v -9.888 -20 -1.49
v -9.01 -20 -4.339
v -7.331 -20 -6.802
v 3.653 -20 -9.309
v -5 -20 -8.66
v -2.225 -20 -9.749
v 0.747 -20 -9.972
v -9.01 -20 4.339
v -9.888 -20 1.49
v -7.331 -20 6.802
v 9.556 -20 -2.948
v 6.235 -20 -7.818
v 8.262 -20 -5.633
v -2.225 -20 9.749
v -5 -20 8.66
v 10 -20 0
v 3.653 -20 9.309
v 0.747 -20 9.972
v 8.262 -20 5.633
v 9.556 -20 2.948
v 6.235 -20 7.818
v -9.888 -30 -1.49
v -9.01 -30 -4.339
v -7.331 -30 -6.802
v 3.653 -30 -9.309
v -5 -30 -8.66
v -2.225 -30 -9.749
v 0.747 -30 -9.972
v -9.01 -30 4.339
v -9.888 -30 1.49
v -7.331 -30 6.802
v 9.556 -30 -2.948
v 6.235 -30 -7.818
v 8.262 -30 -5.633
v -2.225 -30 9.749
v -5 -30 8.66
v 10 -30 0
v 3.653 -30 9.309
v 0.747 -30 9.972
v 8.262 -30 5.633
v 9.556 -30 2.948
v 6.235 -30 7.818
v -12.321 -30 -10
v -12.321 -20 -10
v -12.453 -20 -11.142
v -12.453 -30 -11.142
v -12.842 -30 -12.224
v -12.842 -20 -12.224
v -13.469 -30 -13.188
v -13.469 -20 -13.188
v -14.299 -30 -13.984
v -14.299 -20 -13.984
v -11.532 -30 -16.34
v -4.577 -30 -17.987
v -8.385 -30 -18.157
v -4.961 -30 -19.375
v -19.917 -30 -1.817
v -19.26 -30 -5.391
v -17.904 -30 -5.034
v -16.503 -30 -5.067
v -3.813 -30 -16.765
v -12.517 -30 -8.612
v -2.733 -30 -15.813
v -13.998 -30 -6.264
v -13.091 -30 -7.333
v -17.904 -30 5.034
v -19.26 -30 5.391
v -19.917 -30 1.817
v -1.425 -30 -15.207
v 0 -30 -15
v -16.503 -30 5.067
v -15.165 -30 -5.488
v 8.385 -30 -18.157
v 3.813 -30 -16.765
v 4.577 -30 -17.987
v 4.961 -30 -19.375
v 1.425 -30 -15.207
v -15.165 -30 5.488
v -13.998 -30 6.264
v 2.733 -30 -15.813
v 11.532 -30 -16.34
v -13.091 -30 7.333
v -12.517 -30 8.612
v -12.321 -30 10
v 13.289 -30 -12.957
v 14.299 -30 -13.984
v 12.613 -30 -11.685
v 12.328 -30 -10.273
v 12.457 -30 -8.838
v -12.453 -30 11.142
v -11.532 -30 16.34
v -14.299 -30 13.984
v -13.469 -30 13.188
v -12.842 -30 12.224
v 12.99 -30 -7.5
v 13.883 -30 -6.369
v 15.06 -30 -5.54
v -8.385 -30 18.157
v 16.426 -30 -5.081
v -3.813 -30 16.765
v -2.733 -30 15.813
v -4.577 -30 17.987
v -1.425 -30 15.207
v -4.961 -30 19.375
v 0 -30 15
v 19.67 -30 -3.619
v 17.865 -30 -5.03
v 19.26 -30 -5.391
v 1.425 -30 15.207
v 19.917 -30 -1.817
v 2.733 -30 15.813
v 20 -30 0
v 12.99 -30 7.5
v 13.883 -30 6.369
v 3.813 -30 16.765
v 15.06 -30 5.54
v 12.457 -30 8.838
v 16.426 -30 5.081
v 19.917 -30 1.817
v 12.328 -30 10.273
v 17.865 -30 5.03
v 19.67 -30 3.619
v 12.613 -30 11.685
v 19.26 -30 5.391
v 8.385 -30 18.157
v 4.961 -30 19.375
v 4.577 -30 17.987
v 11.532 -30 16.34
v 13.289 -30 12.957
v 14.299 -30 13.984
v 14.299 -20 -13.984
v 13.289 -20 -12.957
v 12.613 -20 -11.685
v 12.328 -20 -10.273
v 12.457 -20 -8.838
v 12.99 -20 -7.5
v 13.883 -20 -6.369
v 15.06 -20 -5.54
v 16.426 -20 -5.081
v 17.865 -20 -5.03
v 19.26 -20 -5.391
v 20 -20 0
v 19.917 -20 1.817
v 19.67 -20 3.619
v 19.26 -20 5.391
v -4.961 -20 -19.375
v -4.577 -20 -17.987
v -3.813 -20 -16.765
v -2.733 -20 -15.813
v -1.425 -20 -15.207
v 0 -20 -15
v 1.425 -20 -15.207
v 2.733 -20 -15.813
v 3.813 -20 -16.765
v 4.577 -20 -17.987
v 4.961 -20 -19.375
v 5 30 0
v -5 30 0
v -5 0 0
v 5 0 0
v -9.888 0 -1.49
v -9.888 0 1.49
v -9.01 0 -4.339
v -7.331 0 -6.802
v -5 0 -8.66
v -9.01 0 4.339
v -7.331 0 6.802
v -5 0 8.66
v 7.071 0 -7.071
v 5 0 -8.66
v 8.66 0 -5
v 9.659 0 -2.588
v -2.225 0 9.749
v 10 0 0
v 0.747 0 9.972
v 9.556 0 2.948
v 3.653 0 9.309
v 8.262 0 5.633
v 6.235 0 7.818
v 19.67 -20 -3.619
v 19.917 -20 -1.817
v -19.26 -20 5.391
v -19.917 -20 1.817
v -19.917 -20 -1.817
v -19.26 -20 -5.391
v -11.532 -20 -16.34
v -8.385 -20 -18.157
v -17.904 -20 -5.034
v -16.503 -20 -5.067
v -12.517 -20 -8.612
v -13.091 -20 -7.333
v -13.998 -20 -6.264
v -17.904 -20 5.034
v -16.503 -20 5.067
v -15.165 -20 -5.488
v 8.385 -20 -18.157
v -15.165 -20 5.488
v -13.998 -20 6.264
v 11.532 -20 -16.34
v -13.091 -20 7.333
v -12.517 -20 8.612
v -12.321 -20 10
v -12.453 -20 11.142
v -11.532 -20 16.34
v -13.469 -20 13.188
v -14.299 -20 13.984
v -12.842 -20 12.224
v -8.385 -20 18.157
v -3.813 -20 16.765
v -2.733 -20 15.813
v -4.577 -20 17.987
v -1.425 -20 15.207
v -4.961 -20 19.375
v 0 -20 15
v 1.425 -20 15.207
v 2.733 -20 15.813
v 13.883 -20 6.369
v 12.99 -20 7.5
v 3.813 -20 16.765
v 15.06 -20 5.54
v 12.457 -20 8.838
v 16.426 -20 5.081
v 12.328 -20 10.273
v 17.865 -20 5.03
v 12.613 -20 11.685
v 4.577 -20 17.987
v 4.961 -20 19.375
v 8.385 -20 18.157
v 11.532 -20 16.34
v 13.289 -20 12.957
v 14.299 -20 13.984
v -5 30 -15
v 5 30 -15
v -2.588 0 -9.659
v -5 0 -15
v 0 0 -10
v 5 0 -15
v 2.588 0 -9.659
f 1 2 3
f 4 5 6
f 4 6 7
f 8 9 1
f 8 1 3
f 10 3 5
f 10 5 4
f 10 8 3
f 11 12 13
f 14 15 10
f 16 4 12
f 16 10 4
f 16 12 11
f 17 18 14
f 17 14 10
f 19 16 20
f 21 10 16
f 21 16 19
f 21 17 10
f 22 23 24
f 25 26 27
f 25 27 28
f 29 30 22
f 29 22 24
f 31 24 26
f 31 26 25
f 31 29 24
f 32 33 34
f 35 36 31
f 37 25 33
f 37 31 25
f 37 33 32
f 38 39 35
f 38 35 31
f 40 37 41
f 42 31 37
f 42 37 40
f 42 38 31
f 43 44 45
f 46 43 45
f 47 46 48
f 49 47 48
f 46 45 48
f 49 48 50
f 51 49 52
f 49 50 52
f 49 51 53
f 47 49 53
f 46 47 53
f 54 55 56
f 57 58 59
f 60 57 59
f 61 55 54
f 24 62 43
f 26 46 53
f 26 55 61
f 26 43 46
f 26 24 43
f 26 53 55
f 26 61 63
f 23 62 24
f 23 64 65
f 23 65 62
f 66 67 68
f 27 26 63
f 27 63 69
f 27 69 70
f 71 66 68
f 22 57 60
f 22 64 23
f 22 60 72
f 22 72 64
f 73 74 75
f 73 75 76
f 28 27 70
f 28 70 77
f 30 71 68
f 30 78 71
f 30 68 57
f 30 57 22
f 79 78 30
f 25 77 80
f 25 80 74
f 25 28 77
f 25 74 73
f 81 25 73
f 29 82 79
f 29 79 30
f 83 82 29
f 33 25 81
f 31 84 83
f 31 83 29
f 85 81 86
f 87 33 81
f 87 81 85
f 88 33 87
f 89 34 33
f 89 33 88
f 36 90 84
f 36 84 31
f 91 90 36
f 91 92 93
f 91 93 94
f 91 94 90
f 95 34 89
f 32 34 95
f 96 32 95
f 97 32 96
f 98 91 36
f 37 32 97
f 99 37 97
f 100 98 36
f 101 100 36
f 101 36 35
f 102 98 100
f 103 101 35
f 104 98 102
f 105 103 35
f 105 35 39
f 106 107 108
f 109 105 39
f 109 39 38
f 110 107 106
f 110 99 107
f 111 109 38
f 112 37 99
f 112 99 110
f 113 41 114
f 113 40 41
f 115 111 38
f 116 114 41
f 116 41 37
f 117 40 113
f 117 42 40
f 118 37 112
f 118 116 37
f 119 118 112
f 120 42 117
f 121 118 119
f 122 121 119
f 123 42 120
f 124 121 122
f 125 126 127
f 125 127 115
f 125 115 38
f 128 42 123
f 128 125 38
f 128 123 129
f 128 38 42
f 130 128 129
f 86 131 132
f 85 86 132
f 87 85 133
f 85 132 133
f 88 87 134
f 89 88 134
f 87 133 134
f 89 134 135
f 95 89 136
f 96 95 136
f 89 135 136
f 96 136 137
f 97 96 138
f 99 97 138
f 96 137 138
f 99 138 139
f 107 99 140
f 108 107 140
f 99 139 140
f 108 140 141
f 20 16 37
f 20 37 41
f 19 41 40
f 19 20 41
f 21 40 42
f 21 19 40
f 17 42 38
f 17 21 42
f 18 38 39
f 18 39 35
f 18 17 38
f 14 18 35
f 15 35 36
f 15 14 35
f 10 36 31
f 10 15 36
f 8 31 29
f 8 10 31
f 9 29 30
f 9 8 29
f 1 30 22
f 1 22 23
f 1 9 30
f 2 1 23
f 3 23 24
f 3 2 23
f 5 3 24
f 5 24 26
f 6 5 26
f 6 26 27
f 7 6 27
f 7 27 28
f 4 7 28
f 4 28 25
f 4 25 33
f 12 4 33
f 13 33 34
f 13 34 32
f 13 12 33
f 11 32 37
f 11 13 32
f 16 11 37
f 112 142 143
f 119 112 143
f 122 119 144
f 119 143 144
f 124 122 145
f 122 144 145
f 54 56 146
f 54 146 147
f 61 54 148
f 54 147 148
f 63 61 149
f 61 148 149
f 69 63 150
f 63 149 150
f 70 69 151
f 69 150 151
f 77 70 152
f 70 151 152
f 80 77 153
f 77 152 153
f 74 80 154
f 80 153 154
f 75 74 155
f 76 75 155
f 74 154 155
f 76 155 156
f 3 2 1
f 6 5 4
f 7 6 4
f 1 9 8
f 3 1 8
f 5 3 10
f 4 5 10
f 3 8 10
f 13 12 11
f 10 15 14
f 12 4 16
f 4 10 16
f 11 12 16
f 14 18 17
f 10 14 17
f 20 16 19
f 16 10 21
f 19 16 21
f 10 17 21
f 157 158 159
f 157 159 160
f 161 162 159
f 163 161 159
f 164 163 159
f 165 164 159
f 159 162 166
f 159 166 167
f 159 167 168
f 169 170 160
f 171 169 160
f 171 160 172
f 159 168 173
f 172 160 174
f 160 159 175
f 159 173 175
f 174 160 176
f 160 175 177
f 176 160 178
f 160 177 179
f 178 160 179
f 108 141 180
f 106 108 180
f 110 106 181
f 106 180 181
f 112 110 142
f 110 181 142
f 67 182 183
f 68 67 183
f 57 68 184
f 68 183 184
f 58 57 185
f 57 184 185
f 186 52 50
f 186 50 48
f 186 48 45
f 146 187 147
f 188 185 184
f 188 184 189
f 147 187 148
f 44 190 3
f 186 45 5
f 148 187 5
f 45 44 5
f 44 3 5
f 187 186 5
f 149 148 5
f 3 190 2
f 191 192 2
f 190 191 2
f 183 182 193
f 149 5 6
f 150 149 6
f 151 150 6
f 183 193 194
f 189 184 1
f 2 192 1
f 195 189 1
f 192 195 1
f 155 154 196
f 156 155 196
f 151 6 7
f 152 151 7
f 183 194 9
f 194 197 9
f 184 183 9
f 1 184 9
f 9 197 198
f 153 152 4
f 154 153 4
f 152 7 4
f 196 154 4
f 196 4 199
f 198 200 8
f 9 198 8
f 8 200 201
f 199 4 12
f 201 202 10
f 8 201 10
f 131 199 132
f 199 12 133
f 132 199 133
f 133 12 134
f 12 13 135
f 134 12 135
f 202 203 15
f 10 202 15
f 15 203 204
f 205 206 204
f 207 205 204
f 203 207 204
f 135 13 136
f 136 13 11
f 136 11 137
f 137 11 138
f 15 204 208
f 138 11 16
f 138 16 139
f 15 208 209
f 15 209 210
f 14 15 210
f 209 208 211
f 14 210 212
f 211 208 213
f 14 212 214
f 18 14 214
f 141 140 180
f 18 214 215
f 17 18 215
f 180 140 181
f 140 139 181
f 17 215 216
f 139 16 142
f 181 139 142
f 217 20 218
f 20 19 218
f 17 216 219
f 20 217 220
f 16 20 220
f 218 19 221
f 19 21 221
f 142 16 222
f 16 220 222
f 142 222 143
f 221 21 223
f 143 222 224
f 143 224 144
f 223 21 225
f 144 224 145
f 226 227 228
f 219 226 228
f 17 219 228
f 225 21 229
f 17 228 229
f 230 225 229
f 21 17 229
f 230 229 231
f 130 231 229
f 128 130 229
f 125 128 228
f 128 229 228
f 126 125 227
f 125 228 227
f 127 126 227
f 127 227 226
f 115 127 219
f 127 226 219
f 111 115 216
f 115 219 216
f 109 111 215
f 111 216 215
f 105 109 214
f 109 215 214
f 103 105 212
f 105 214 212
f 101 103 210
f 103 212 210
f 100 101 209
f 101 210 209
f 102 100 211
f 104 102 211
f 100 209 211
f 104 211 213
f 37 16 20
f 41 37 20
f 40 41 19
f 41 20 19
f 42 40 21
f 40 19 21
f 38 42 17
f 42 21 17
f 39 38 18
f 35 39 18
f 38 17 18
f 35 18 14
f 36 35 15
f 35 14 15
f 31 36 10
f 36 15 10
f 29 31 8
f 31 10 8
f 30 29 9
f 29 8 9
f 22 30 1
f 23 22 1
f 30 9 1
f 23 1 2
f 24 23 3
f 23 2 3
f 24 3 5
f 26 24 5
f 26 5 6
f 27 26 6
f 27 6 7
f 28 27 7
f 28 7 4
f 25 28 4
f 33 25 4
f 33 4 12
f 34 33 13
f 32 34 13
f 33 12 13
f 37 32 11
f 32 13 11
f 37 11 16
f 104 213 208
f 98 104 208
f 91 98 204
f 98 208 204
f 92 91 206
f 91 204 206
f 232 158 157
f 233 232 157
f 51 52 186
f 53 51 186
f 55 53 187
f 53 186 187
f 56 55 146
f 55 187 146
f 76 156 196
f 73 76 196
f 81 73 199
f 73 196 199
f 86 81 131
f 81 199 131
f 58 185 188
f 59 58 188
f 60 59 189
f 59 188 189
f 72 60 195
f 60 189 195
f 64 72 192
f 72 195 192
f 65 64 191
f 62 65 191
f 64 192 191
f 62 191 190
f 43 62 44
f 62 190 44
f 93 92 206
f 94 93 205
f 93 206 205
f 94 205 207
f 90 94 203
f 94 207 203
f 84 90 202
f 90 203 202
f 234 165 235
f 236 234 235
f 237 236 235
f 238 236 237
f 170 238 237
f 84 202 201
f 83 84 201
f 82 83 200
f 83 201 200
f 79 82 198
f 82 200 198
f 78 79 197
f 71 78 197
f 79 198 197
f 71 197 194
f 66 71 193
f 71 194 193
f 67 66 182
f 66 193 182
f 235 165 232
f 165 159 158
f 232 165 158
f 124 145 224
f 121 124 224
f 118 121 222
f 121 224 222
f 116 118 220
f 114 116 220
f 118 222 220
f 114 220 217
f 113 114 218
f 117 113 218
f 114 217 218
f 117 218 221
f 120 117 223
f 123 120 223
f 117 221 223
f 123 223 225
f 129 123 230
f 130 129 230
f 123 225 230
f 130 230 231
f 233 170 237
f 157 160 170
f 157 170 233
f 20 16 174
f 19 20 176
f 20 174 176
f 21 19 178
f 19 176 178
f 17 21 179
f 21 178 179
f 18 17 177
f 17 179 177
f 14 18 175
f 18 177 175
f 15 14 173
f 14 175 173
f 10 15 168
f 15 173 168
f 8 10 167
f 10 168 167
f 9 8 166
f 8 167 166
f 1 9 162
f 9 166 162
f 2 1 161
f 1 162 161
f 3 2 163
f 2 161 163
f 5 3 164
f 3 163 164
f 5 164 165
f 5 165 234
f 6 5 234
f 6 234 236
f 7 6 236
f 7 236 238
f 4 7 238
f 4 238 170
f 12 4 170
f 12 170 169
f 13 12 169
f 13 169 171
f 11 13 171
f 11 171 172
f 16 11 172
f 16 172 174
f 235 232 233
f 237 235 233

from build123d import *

# Parameters (mm, degrees)
F0_R     = 10
F1_DEPTH = 20
F2_R     = 10
F3_DEPTH = 10
F4_R     = 10
F5_DEPTH = 10
F6_W     = 10
F6_H     = 30
F7_DEPTH = 15


with BuildPart() as f1:
    # F0 (on Front) → F1 (new body)
    with BuildSketch(Plane.XZ):
        Circle(F0_R)
    extrude(amount=F1_DEPTH)

    # F6 (on Top) → F7 (join)
    with BuildSketch(Plane.XY):
        with Locations((0, 15)):
            Rectangle(F6_W, F6_H)
    extrude(amount=-F7_DEPTH)


with BuildPart() as f3:
    # F2 (on face) → F3 (new body)
    with BuildSketch(Plane.XZ.offset(20)):
        with BuildLine():
            ThreePointArc((19.259634, -5.391335), (19.814044, -2.720967), (20, 0))
            ThreePointArc((20, 0), (19.814044, 2.720967), (19.259634, 5.391335))
            ThreePointArc((19.259634, 5.391335), (12.990381, 7.5), (14.29885, 13.983665))
            ThreePointArc((14.29885, 13.983665), (10, 17.320508), (4.960784, 19.375))
            ThreePointArc((4.960784, 19.375), (0, 15), (-4.960784, 19.375))
            ThreePointArc((-4.960784, 19.375), (-10, 17.320508), (-14.29885, 13.983665))
            ThreePointArc((-14.29885, 13.983665), (-12.842323, 12.223928), (-12.320508, 10))
            ThreePointArc((-12.320508, 10), (-14.55425, 5.834929), (-19.259634, 5.391335))
            ThreePointArc((-19.259634, 5.391335), (-20, 0), (-19.259634, -5.391335))
            ThreePointArc((-19.259634, -5.391335), (-14.55425, -5.834929), (-12.320508, -10))
            ThreePointArc((-12.320508, -10), (-12.842323, -12.223928), (-14.29885, -13.983665))
            ThreePointArc((-14.29885, -13.983665), (-10, -17.320508), (-4.960784, -19.375))
            ThreePointArc((-4.960784, -19.375), (0, -15), (4.960784, -19.375))
            ThreePointArc((4.960784, -19.375), (10, -17.320508), (14.29885, -13.983665))
            ThreePointArc((14.29885, -13.983665), (12.990381, -7.5), (19.259634, -5.391335))
        make_face()
        Circle(F2_R, mode=Mode.SUBTRACT)
    extrude(amount=F3_DEPTH)


with BuildPart() as f5:
    # F4 (on face) → F5 (new body)
    with BuildSketch(Plane.XZ.offset(20)):
        Circle(F4_R)
    extrude(amount=F5_DEPTH)


solid = Compound([f1.part, f3.part, f5.part])
